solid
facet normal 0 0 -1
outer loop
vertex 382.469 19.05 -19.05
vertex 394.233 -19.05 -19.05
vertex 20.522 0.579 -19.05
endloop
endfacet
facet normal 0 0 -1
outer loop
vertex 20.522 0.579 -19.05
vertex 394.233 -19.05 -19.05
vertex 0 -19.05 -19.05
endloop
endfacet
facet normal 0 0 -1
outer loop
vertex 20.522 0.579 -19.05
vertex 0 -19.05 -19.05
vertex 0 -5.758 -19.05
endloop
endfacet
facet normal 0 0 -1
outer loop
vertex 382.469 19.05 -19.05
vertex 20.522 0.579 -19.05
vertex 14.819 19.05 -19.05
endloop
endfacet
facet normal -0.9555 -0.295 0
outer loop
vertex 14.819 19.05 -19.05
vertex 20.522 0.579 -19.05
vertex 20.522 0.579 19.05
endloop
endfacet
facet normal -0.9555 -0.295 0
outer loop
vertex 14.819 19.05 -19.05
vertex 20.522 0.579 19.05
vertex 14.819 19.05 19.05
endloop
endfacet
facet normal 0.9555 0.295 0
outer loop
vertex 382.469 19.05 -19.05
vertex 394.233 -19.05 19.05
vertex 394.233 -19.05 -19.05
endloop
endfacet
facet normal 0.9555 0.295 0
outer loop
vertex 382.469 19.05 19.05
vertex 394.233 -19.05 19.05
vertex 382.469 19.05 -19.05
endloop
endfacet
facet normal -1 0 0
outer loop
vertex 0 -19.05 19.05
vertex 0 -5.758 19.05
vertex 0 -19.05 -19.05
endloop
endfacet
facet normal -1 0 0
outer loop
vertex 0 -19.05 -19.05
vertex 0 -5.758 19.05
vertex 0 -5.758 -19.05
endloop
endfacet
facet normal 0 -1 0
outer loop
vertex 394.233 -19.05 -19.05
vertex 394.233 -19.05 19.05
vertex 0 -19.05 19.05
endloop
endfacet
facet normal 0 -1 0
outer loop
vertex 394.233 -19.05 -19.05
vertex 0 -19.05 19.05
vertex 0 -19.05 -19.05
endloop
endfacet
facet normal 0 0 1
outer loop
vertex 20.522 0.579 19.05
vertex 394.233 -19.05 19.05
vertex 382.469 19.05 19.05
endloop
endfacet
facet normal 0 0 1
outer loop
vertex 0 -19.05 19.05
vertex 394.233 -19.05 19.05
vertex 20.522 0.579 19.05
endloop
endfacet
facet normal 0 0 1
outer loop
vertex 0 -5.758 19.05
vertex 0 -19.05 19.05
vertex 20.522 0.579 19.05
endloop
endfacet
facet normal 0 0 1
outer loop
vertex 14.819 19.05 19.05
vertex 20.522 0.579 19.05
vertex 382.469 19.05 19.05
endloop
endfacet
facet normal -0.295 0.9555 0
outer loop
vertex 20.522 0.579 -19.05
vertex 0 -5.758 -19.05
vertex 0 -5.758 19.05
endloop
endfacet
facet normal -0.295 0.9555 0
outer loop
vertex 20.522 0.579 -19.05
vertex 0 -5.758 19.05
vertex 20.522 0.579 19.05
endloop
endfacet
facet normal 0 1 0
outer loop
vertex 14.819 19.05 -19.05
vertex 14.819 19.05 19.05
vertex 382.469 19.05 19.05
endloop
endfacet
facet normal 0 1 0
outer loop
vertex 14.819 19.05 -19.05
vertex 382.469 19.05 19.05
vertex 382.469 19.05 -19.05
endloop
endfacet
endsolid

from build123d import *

# Parameters (mm, degrees)
SKETCH1_W               = 38.1
SKETCH1_H               = 38.1
BOSS_EXTRUDE1_DEPTH     = 394.2334
CUT_EXTRUDE1_DEPTH      = 397.528039583
CUT_EXTRUDE2_DEPTH      = 397.528039583
CUT_EXTRUDE2_DEPTH_BACK = 397.528039583


with BuildPart() as part:
    # Sketch1 → Boss-Extrude1 (new body)
    with BuildSketch(Plane(origin=(0, 0, 0), x_dir=(0, 0, -1), z_dir=(1, 0, 0))):
        Rectangle(SKETCH1_W, SKETCH1_H)
    extrude(amount=BOSS_EXTRUDE1_DEPTH)

    # Sketch2 → Cut-Extrude1 (cut, through all)
    with BuildSketch(Plane.XY.offset(19.05)):
        Polygon((394.2334, -19.05), (382.468621152, 19.05), (394.2334, 19.05), align=None)
    extrude(amount=-CUT_EXTRUDE1_DEPTH, mode=Mode.SUBTRACT)

    # Sketch3 → Cut-Extrude2 (cut, two sides: drawn at the far end of the back side and taken through both)
    with BuildSketch(Plane.XY.offset(19.05).offset(-CUT_EXTRUDE2_DEPTH_BACK)):
        Polygon((0, 19.05), (0, -5.758314958), (20.522286578, 0.578697196), (14.818591236, 19.05), align=None)
    extrude(amount=CUT_EXTRUDE2_DEPTH + CUT_EXTRUDE2_DEPTH_BACK, mode=Mode.SUBTRACT)


solid = part.part
